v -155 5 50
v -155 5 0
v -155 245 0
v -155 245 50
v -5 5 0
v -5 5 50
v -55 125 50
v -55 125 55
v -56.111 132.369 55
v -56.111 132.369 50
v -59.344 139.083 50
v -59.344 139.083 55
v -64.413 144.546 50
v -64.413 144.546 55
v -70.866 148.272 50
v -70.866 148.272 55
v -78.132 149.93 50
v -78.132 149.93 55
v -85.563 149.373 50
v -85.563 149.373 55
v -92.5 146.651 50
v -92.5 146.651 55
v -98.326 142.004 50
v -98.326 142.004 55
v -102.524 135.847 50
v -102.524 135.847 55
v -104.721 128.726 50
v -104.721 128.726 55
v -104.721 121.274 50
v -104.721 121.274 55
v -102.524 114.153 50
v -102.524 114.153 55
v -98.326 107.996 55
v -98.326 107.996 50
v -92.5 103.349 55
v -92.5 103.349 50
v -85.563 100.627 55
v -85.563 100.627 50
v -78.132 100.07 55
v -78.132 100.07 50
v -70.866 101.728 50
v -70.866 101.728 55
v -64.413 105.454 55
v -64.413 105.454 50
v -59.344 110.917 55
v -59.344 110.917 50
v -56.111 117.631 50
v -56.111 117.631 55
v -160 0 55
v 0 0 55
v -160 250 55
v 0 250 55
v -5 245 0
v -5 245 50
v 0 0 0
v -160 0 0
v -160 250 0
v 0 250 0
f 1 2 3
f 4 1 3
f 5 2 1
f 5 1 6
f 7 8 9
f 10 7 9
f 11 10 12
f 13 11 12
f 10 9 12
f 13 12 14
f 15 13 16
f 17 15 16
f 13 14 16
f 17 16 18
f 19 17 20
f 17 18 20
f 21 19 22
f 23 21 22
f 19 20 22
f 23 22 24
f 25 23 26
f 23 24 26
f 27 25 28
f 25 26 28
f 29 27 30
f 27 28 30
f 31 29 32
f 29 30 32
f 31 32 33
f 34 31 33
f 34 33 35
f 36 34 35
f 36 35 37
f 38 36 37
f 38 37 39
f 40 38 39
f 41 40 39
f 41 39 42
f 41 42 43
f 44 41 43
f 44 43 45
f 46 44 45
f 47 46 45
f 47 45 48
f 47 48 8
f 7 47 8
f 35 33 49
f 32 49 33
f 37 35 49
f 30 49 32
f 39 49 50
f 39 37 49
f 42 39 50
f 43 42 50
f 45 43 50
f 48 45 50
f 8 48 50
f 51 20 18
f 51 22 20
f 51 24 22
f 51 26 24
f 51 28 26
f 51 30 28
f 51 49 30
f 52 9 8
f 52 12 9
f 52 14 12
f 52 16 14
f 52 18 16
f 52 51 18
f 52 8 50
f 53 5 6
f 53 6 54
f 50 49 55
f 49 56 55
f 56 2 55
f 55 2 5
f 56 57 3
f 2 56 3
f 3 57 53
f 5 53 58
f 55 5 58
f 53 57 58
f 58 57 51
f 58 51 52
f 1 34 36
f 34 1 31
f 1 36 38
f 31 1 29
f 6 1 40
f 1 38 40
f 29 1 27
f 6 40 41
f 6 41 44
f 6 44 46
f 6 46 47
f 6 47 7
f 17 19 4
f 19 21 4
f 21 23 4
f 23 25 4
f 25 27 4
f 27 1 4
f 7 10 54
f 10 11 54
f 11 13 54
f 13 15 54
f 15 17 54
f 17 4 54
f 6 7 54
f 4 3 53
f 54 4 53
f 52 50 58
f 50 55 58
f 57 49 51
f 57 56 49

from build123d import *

# Parameters (mm, degrees)
ESQUISSE1_W             = 160
ESQUISSE1_H             = 250
ESQUISSE1_W_2           = 150
ESQUISSE1_H_2           = 240
BOSS_EXTRU_1_DEPTH      = 50
ESQUISSE2_W             = 160
ESQUISSE2_H             = 250
BOSS_EXTRU_2_DEPTH      = 5
ESQUISSE4_R             = 25
ENL_V_MAT_EXTRU_1_DEPTH = 10


with BuildPart() as part:
    # Esquisse1 → Boss.-Extru.1 (new body)
    with BuildSketch(Plane.XY):
        with Locations((-80, 125)):
            Rectangle(ESQUISSE1_W, ESQUISSE1_H)
        with Locations((-80, 125)):
            Rectangle(ESQUISSE1_W_2, ESQUISSE1_H_2, mode=Mode.SUBTRACT)
    extrude(amount=BOSS_EXTRU_1_DEPTH)

    # Esquisse2 → Boss.-Extru.2 (add)
    with BuildSketch(Plane.XY.offset(50)):
        with Locations((-80, 125)):
            Rectangle(ESQUISSE2_W, ESQUISSE2_H)
    extrude(amount=BOSS_EXTRU_2_DEPTH)

    # Esquisse4 → Enlèv. mat.-Extru.1 (cut)
    with BuildSketch(Plane.XY.offset(55)):
        with Locations((-80, 125)):
            Circle(ESQUISSE4_R)
    extrude(amount=-ENL_V_MAT_EXTRU_1_DEPTH, mode=Mode.SUBTRACT)


solid = part.part
